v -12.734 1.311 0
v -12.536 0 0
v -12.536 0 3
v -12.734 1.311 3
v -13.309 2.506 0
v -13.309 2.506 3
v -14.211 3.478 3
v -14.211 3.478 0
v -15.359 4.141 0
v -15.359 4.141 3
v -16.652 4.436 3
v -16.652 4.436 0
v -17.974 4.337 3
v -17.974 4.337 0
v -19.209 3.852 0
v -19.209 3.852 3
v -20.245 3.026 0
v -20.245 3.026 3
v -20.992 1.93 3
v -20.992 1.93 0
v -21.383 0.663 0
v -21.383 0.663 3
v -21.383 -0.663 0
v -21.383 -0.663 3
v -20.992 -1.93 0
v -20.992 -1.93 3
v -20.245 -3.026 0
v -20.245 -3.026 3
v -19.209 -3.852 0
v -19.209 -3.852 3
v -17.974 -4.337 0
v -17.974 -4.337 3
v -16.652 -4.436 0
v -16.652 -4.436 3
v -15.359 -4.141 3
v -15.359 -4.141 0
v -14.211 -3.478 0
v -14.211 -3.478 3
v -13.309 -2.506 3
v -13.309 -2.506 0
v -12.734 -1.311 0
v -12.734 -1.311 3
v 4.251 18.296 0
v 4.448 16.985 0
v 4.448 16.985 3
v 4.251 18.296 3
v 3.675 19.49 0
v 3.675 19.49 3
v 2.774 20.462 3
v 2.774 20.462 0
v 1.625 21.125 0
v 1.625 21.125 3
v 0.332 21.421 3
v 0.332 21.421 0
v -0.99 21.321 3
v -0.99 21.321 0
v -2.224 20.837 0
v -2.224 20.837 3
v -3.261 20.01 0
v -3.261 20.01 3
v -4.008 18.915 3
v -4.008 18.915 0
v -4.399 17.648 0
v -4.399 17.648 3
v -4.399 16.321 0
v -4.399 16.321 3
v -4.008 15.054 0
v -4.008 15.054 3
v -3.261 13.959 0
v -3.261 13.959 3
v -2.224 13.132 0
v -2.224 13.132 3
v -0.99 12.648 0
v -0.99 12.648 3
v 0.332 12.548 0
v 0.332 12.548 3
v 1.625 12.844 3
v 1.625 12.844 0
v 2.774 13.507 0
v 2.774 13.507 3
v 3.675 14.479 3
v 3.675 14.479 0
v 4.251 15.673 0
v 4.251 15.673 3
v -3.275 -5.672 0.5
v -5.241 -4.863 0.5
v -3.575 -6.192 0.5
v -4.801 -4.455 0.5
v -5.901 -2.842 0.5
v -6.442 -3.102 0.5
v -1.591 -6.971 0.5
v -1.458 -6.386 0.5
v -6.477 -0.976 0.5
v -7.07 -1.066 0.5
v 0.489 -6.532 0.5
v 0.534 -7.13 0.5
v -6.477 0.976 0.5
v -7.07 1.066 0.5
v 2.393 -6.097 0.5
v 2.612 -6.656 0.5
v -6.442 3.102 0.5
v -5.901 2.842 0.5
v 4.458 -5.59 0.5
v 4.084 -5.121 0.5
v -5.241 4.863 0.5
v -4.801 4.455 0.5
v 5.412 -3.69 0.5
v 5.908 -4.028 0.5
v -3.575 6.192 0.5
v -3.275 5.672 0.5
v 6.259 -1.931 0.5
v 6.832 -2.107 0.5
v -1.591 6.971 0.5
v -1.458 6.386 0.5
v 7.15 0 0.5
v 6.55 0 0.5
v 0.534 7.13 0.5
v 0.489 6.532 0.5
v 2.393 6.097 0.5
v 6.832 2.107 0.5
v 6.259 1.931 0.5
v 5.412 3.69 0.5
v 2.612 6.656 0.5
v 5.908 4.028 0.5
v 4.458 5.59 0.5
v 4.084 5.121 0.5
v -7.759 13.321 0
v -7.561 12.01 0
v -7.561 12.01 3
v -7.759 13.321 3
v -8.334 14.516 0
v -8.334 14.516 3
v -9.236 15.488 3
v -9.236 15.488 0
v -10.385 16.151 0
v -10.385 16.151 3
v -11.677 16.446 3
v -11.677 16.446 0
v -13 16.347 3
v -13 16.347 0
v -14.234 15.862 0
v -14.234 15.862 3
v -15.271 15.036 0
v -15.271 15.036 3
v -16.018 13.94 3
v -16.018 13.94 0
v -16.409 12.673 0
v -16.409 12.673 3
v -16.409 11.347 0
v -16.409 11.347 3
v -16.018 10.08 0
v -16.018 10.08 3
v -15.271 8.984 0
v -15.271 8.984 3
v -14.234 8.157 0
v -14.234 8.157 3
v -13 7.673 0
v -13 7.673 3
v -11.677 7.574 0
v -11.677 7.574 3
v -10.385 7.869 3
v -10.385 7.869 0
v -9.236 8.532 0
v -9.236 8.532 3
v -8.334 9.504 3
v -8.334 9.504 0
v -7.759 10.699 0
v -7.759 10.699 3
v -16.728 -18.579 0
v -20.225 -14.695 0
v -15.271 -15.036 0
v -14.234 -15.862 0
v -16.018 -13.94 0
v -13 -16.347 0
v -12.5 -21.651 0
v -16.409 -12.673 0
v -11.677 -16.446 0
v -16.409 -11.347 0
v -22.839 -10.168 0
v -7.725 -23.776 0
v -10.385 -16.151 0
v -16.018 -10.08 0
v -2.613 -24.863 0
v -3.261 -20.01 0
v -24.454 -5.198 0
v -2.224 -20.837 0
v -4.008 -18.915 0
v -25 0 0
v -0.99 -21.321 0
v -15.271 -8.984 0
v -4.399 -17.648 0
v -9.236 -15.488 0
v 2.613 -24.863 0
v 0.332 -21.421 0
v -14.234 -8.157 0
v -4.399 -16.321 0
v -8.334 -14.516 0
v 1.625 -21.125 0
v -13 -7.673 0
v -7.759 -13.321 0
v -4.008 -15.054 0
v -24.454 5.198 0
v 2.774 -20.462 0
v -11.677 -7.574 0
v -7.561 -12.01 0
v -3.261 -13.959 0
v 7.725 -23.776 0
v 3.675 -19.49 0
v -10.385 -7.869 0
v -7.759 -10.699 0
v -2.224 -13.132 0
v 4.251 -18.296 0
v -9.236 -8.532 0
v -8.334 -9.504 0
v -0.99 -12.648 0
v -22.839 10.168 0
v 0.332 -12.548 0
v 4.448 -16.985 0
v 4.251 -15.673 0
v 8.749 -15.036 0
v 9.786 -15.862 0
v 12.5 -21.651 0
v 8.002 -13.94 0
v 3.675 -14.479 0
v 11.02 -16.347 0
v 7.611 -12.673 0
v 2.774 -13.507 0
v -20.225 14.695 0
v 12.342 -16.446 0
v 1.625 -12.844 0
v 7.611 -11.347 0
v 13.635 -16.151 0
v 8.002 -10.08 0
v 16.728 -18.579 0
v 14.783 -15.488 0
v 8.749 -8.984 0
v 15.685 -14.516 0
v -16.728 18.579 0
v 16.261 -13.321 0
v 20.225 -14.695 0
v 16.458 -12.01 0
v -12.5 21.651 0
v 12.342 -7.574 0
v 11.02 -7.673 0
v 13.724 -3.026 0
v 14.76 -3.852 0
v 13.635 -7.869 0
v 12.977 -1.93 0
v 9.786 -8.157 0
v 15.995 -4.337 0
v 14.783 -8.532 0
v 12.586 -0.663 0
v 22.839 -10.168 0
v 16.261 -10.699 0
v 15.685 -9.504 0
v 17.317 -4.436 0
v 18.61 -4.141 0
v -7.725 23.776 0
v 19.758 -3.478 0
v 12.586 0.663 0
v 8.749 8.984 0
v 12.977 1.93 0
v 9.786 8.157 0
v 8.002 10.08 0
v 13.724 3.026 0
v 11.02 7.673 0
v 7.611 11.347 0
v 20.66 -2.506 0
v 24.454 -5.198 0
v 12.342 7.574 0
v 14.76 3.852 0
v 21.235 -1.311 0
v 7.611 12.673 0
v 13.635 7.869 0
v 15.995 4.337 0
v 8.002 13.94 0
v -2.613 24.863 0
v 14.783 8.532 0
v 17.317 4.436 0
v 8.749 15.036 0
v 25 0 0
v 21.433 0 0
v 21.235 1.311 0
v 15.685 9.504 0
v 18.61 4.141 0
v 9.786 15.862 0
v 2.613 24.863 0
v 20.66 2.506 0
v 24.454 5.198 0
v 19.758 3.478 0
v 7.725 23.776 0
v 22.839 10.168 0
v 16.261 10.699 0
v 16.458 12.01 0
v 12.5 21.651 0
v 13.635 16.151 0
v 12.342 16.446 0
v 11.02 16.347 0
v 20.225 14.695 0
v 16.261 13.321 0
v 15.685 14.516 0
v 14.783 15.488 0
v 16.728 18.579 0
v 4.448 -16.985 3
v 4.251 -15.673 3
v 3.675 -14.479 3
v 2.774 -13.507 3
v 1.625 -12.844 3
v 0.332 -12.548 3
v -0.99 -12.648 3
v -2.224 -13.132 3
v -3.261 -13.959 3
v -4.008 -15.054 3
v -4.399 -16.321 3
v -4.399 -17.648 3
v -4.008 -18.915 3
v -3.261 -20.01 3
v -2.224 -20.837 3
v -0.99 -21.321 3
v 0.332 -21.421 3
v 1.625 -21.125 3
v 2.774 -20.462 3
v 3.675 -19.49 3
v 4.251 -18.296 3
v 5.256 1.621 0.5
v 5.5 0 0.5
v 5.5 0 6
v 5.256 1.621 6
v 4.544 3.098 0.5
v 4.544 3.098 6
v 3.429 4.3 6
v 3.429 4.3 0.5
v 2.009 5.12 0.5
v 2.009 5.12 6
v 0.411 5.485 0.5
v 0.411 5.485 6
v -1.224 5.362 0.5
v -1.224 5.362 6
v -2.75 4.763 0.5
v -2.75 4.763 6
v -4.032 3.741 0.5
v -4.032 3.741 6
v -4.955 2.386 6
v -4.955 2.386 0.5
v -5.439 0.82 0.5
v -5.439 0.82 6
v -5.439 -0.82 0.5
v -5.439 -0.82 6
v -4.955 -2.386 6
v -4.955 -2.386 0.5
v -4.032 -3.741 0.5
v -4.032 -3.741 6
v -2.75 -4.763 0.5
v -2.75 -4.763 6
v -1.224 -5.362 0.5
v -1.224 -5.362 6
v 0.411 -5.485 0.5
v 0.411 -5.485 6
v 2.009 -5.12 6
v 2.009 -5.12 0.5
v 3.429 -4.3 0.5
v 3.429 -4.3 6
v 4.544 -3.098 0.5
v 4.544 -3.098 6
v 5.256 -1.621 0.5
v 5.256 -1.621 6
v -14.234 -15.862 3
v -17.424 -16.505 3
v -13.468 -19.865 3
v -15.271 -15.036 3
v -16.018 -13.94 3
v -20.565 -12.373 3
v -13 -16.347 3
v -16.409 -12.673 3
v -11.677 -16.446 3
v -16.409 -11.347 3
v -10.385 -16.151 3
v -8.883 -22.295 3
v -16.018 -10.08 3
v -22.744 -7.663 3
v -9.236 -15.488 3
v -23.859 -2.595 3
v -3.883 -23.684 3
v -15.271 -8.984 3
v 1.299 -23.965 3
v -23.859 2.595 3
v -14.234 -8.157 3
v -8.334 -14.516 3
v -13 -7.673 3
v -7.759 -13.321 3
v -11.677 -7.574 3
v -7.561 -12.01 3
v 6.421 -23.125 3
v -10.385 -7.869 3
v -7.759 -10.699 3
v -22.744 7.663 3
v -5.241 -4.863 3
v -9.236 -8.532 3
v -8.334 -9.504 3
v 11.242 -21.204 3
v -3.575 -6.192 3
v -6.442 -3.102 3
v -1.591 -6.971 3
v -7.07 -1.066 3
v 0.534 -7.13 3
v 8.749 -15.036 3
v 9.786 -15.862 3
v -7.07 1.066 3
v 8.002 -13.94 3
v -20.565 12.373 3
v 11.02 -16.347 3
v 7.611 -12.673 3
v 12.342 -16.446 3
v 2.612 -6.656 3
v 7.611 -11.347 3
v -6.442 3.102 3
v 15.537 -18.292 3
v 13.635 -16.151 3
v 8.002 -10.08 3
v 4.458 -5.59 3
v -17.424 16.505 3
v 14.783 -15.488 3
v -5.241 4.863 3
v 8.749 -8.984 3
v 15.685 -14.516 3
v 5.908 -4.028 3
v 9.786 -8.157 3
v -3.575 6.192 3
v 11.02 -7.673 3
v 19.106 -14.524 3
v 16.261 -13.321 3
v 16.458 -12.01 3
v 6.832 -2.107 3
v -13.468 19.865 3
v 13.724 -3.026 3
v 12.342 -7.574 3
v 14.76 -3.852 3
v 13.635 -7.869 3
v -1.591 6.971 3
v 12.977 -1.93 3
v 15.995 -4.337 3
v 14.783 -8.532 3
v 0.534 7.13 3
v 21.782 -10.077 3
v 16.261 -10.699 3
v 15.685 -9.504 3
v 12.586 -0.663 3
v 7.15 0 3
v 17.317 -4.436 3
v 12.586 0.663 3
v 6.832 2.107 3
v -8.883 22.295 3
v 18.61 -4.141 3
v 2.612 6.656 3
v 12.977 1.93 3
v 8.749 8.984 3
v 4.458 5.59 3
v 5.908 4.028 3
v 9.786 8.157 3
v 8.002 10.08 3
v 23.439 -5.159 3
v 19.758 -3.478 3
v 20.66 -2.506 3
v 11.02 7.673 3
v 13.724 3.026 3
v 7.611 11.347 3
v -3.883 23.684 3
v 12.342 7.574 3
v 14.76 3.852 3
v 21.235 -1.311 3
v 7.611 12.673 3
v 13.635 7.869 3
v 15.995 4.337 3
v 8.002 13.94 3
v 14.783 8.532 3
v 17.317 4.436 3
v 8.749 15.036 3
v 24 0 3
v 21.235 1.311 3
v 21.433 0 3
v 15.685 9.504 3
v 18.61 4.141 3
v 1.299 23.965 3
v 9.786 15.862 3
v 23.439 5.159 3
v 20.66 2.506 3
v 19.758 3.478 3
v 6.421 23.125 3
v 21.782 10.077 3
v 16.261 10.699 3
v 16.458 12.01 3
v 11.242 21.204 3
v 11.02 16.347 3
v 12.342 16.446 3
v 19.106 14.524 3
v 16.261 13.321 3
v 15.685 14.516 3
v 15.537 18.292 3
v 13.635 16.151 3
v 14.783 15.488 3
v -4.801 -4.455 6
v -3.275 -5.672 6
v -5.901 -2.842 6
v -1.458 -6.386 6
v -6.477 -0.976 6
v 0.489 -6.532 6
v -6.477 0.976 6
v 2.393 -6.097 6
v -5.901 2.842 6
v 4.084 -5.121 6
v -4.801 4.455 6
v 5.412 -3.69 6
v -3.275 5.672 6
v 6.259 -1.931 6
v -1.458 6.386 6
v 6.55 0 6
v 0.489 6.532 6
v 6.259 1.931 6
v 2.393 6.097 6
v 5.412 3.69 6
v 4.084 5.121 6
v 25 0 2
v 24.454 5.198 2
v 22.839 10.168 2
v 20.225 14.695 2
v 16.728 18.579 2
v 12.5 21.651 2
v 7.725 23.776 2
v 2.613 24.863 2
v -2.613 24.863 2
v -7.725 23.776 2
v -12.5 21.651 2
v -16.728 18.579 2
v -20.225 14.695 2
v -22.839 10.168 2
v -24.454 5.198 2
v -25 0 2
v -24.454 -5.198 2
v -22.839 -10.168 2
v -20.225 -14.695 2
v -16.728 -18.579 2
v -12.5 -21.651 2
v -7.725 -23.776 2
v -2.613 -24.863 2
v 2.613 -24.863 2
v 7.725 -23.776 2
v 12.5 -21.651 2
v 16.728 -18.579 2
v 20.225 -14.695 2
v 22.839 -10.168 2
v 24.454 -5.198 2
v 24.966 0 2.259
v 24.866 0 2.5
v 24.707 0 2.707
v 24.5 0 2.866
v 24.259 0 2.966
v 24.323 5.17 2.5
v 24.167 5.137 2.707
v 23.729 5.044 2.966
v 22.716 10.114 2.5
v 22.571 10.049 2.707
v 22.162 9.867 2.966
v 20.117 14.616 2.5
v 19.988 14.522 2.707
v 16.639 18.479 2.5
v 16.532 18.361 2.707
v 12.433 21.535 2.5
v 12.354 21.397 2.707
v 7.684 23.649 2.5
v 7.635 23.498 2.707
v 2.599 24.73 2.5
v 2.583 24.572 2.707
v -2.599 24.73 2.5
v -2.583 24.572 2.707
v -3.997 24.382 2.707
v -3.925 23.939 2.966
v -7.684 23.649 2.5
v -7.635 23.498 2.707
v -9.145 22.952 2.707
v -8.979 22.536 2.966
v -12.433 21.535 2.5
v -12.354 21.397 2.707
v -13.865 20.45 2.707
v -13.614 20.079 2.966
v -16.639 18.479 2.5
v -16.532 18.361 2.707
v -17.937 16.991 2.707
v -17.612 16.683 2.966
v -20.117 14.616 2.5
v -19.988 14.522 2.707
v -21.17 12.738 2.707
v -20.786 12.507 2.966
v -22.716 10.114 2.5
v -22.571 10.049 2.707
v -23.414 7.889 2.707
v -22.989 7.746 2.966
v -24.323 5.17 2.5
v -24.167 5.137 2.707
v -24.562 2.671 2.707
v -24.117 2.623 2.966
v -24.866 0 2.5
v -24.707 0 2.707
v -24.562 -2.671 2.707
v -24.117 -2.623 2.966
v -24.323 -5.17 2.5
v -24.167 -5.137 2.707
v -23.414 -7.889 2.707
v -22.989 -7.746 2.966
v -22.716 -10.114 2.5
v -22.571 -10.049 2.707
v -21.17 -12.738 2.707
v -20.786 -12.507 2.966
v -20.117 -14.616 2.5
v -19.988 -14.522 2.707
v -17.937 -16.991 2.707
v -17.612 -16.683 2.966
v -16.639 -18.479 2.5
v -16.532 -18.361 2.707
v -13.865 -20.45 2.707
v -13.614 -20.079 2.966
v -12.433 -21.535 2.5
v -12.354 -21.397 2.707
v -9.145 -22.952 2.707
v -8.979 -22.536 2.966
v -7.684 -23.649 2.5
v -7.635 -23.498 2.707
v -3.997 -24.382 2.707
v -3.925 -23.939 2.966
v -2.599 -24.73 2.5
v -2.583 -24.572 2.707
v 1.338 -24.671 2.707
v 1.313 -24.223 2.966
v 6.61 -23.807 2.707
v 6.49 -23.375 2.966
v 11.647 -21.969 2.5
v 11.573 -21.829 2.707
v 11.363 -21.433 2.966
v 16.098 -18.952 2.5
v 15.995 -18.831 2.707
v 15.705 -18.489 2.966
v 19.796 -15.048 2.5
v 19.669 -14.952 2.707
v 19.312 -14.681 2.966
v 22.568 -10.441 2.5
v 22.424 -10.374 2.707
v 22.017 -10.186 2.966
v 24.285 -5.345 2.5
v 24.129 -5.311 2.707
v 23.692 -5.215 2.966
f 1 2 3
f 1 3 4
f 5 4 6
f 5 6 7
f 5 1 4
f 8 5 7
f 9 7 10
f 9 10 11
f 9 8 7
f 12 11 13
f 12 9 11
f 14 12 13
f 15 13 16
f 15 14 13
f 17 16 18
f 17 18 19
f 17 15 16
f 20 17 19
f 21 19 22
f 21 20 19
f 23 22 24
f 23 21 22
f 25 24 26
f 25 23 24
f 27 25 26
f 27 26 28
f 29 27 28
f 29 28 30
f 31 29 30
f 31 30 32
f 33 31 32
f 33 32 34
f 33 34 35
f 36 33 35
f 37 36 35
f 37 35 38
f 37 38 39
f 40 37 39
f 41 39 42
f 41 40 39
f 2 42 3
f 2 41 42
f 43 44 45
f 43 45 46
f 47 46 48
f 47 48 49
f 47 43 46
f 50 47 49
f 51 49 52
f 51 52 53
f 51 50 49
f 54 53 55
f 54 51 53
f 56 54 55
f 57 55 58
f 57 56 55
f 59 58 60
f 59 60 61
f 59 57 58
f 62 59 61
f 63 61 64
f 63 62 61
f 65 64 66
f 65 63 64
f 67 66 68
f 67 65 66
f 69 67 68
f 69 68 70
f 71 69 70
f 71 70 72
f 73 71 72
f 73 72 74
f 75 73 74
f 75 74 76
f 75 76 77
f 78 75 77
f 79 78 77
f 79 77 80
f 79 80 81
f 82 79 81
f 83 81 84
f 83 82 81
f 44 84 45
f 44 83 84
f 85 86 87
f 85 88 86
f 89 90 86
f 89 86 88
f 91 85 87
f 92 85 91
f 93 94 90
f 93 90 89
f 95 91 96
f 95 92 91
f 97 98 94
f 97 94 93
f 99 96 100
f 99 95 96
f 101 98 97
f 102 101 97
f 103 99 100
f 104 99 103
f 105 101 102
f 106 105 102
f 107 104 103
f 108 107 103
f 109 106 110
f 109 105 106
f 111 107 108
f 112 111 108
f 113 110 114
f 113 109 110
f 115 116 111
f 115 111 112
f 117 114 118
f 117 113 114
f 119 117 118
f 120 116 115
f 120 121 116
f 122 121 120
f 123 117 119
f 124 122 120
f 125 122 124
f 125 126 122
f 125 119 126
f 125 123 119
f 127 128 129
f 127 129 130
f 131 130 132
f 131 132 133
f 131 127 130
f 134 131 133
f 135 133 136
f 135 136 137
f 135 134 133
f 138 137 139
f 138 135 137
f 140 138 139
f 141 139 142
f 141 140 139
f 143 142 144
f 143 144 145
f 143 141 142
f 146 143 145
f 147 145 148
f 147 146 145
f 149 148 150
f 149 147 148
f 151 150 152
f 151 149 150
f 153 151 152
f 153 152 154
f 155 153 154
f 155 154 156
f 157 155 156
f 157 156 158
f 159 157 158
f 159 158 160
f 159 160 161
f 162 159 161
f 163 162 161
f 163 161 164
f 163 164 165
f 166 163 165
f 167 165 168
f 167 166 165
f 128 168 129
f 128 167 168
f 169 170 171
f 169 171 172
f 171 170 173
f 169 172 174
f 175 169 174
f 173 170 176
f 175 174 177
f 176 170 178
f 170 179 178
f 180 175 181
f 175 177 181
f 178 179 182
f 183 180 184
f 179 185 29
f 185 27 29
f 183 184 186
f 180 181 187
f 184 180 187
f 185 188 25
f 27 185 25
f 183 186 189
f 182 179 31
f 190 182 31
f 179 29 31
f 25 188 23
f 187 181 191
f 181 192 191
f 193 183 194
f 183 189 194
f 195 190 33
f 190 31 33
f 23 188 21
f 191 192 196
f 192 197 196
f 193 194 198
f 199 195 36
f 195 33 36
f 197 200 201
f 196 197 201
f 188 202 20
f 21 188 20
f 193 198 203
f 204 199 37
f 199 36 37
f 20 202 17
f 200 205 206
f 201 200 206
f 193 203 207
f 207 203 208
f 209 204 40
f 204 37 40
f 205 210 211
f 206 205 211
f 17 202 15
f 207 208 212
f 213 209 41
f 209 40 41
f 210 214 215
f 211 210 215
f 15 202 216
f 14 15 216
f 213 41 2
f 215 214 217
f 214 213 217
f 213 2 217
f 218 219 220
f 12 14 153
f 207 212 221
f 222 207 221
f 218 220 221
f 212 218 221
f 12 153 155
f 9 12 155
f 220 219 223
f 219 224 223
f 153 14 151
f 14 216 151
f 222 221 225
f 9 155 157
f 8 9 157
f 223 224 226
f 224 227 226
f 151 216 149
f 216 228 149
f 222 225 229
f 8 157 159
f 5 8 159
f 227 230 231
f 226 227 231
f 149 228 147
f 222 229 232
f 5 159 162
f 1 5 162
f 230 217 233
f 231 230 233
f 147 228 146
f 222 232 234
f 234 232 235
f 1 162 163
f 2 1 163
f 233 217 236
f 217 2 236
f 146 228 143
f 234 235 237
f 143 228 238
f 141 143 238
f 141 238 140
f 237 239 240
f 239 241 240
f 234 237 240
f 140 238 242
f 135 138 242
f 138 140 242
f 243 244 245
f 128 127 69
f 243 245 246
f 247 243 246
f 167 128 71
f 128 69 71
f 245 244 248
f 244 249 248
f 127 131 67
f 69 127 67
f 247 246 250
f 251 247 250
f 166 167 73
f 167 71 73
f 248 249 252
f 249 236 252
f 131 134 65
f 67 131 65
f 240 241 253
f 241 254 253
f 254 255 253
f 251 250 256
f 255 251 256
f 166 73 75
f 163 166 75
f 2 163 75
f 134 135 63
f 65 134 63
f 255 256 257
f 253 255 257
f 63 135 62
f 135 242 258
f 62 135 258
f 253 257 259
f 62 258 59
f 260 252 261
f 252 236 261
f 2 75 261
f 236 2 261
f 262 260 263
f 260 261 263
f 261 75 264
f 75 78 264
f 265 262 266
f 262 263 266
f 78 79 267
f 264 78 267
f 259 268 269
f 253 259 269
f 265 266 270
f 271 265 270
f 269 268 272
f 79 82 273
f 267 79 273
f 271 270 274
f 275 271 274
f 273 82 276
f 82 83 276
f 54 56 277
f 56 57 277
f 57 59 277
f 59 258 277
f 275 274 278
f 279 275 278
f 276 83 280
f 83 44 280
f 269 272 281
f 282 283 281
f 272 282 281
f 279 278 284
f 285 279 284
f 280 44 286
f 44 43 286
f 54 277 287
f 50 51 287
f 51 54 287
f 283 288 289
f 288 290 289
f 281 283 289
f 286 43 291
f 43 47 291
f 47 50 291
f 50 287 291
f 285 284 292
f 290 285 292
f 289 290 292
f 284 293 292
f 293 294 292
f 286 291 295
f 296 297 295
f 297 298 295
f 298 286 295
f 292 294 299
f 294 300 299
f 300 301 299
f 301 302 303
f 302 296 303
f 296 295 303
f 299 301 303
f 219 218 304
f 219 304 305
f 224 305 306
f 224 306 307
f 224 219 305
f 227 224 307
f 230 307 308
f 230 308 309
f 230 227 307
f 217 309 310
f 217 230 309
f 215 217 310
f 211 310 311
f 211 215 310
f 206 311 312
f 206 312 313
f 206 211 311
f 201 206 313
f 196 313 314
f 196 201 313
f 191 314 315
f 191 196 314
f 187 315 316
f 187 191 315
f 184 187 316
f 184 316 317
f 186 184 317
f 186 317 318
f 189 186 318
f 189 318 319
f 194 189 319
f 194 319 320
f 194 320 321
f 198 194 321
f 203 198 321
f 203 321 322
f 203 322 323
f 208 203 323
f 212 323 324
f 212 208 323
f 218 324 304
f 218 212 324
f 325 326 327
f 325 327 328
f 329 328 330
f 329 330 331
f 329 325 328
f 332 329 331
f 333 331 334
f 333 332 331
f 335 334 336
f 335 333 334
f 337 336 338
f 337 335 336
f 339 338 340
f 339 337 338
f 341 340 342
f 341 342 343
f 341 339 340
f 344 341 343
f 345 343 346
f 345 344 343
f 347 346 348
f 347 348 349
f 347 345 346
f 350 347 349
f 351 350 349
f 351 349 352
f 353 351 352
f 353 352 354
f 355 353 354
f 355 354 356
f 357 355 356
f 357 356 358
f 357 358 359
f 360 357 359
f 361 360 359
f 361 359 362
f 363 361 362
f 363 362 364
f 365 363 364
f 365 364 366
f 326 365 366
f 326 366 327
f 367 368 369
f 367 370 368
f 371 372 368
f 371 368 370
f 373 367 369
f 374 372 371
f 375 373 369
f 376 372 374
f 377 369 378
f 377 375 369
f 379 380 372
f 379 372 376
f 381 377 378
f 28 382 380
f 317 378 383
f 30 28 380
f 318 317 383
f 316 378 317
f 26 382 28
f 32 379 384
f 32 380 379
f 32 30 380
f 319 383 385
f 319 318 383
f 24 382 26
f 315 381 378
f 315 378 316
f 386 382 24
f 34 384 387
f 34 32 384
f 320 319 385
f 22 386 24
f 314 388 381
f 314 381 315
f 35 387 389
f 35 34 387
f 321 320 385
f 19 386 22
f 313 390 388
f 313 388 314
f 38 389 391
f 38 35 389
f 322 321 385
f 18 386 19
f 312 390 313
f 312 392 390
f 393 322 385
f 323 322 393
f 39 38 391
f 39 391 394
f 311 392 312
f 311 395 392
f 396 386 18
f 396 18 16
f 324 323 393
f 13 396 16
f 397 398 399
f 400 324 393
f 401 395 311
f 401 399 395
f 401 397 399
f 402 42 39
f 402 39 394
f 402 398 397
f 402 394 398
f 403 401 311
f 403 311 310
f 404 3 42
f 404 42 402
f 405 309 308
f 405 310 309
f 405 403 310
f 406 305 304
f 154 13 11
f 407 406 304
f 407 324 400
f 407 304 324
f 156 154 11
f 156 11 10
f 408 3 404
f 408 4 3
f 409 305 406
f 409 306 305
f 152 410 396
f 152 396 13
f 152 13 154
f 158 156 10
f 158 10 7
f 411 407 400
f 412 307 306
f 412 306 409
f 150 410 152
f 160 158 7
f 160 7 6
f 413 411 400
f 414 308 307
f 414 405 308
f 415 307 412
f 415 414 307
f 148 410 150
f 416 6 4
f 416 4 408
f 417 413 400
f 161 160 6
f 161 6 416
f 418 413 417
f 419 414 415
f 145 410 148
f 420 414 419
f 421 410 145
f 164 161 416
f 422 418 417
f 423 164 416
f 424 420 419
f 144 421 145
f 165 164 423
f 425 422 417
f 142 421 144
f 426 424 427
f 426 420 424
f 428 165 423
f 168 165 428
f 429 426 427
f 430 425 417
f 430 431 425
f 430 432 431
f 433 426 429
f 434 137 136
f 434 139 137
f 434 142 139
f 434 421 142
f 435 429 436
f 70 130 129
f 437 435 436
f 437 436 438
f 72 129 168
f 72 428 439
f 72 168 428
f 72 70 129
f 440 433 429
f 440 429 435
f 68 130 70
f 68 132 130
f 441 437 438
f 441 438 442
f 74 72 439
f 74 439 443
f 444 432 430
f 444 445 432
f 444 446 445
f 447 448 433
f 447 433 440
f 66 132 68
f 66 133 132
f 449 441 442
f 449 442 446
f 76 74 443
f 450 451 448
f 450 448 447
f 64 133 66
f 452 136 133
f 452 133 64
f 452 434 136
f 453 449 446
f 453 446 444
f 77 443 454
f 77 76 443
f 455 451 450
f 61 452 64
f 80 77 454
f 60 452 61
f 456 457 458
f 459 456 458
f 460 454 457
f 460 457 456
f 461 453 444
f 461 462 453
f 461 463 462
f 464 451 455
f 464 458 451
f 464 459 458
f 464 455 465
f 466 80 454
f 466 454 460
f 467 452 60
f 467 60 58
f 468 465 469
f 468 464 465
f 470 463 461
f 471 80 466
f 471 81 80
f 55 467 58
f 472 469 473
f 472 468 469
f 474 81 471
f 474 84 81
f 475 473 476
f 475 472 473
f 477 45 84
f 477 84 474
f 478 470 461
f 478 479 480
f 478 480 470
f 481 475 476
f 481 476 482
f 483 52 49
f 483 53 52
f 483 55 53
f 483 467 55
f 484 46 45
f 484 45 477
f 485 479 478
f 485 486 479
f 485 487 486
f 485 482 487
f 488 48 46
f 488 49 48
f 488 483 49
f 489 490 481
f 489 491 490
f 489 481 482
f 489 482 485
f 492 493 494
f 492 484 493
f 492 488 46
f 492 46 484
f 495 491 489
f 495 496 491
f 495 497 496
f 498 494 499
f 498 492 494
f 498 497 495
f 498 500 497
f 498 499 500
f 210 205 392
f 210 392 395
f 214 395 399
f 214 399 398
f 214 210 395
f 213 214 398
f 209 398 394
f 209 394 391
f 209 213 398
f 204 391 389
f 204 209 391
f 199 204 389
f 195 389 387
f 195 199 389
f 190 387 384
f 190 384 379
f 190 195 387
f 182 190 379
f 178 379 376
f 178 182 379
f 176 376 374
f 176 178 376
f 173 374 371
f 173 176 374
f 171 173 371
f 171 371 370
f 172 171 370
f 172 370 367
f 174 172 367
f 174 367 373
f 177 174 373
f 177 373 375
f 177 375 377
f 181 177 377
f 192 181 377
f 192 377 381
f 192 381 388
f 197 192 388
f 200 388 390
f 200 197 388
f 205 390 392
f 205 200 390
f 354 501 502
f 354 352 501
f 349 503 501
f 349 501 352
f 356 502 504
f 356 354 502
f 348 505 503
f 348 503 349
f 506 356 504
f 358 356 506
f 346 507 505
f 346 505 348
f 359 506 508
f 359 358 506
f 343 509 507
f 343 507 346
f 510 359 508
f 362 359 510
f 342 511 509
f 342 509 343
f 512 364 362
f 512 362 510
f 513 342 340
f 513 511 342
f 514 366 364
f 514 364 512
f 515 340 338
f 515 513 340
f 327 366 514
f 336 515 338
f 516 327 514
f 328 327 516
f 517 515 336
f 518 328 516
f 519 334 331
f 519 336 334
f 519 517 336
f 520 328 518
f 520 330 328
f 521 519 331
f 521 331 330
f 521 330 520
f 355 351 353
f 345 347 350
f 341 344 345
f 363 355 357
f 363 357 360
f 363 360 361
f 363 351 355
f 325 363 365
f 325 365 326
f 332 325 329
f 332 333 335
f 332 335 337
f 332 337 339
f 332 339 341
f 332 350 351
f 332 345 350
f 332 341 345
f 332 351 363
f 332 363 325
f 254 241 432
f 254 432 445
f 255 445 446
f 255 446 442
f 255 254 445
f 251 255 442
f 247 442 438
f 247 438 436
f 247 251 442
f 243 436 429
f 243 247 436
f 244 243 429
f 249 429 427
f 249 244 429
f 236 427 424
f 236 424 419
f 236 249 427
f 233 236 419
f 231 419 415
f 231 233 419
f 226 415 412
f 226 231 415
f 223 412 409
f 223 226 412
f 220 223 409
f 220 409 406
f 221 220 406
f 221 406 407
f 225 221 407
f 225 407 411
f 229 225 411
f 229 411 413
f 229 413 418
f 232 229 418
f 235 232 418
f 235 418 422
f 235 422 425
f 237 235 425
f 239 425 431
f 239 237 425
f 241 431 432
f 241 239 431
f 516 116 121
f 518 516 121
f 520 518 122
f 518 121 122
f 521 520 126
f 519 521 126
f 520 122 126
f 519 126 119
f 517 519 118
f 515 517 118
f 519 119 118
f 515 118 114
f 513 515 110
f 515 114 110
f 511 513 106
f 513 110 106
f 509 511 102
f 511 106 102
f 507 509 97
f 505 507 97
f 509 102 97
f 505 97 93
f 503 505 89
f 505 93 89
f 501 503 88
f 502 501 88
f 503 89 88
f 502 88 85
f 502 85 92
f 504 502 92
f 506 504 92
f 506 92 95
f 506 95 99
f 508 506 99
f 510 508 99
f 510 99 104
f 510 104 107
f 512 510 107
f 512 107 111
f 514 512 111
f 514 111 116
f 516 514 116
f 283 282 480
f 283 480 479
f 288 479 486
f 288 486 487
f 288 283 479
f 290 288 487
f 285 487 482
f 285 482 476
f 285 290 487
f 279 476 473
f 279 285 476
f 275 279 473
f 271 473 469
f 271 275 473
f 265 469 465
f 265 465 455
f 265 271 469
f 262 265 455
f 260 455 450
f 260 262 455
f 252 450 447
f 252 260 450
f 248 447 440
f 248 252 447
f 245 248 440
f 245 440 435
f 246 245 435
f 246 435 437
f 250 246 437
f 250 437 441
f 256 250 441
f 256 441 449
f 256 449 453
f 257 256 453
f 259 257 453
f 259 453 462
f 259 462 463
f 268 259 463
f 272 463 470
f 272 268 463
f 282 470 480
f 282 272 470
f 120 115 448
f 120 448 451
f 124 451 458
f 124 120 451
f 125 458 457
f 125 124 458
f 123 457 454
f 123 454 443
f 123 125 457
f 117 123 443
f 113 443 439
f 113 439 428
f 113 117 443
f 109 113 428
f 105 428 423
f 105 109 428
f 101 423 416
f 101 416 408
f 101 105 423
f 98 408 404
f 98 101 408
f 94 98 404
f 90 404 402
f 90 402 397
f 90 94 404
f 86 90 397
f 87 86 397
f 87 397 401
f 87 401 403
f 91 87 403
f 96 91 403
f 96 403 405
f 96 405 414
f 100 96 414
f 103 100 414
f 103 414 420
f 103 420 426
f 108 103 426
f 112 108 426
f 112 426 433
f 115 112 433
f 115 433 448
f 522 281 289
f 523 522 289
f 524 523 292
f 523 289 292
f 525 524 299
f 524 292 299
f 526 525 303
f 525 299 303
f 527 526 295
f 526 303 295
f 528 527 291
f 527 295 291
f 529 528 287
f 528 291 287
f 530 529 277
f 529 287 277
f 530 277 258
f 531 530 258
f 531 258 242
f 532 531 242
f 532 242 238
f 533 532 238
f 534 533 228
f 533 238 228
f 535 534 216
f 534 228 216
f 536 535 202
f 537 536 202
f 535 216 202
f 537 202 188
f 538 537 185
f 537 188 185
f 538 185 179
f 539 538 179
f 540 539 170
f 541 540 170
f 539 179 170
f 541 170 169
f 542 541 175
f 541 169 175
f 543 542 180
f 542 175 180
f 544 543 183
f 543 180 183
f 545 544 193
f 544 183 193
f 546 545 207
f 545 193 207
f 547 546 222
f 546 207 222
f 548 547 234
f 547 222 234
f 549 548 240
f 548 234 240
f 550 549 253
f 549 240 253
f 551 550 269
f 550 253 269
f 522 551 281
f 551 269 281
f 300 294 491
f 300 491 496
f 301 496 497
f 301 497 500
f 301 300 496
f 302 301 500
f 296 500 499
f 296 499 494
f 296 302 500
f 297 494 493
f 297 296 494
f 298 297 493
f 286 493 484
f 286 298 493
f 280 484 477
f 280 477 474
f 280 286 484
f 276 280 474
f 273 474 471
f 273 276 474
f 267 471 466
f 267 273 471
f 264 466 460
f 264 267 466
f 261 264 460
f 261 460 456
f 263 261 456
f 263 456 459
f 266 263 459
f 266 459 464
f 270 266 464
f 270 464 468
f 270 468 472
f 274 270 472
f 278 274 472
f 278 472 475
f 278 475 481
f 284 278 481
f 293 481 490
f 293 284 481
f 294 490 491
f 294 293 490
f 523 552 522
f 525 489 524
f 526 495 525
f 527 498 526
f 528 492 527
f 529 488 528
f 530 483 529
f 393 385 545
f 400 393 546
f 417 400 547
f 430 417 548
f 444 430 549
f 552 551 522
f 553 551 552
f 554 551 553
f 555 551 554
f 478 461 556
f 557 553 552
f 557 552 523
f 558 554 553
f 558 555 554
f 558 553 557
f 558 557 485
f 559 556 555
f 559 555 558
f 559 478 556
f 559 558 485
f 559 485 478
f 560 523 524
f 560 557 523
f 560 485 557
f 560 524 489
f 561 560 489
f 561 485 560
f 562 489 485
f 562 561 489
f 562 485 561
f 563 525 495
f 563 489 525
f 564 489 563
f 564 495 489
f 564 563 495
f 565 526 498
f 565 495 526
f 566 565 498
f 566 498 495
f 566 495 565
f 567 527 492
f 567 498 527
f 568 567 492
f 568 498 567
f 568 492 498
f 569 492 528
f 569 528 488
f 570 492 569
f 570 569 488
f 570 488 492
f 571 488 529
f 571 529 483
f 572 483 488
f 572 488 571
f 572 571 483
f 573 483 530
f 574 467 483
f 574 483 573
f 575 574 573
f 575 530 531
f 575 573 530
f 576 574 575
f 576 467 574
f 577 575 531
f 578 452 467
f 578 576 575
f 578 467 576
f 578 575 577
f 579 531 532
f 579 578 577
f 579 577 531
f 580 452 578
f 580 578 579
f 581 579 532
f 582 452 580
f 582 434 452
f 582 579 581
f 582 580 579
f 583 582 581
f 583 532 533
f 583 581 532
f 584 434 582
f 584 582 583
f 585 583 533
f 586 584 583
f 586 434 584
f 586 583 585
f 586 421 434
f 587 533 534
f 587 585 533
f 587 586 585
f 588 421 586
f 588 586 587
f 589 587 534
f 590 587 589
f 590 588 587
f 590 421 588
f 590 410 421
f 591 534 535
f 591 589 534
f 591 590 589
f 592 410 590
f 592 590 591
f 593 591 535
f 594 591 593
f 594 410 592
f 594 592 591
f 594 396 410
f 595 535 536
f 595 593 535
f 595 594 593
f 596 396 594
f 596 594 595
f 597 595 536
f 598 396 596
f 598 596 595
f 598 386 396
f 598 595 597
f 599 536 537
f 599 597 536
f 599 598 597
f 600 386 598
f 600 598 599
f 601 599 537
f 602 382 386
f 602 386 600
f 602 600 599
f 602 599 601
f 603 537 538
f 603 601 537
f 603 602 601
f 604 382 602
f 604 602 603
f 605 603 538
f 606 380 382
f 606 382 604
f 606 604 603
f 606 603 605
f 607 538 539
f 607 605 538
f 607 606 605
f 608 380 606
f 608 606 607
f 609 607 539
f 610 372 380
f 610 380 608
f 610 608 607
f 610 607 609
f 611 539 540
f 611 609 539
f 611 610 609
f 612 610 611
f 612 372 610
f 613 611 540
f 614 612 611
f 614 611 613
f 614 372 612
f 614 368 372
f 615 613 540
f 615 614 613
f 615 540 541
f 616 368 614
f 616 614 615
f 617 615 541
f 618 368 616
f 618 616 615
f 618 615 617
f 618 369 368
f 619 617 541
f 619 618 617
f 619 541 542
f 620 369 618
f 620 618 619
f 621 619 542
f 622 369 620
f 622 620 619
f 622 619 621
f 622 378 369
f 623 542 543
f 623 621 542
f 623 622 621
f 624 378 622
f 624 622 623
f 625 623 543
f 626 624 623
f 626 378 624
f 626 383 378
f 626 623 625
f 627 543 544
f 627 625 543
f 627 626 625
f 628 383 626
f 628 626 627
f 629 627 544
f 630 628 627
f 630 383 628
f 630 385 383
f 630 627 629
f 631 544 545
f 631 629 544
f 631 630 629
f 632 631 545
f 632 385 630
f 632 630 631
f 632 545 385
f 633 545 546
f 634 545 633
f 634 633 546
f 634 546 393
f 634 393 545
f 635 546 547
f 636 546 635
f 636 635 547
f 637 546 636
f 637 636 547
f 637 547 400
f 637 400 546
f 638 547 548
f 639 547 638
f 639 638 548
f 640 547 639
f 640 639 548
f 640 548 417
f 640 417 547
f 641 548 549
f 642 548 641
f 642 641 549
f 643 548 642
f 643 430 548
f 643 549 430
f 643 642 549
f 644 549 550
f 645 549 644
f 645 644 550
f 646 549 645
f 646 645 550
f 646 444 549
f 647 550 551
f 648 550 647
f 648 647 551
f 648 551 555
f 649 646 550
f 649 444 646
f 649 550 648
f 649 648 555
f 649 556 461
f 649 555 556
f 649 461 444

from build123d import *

# Parameters (mm, degrees)
F0_R     = 6.55
F0_R_2   = 5.5
F1_DEPTH = 6
F0_R_3   = 7.15
F2_DEPTH = 0.5
F0_R_4   = 25
F0_R_5   = 4.448453
F3_DEPTH = 3
F4_R     = 1


with BuildPart() as f1:
    # F0 (on Top) → F1 (new body)
    with BuildSketch(Plane.XY):
        Circle(F0_R)
        Circle(F0_R_2, mode=Mode.SUBTRACT)
    extrude(amount=F1_DEPTH)

    # F0 (on Top) → F2 (join)
    with BuildSketch(Plane.XY):
        Circle(F0_R_3)
        Circle(F0_R, mode=Mode.SUBTRACT)
        Circle(F0_R_2)
    extrude(amount=F2_DEPTH)

    # F0 (on Top) → F3 (join)
    with BuildSketch(Plane.XY):
        Circle(F0_R_4)
        with Locations((-12.009858, -12.009858)):
            Circle(F0_R_5, mode=Mode.SUBTRACT)
        with Locations((0, -16.984504)):
            Circle(F0_R_5, mode=Mode.SUBTRACT)
        with Locations((12.009858, -12.009858)):
            Circle(F0_R_5, mode=Mode.SUBTRACT)
        with Locations((-16.984504, 0)):
            Circle(F0_R_5, mode=Mode.SUBTRACT)
        with Locations((-12.009858, 12.009858)):
            Circle(F0_R_5, mode=Mode.SUBTRACT)
        Circle(F0_R_3, mode=Mode.SUBTRACT)
        with Locations((12.009858, 12.009858)):
            Circle(F0_R_5, mode=Mode.SUBTRACT)
        with Locations((16.984504, 0)):
            Circle(F0_R_5, mode=Mode.SUBTRACT)
        with Locations((0, 16.984504)):
            Circle(F0_R_5, mode=Mode.SUBTRACT)
    extrude(amount=F3_DEPTH)

    # F4
    f4_edges = [f1.edges().sort_by_distance(p)[0] for p in [
        (-25, 0, 3),
    ]]
    fillet(f4_edges, radius=F4_R)


solid = f1.part
